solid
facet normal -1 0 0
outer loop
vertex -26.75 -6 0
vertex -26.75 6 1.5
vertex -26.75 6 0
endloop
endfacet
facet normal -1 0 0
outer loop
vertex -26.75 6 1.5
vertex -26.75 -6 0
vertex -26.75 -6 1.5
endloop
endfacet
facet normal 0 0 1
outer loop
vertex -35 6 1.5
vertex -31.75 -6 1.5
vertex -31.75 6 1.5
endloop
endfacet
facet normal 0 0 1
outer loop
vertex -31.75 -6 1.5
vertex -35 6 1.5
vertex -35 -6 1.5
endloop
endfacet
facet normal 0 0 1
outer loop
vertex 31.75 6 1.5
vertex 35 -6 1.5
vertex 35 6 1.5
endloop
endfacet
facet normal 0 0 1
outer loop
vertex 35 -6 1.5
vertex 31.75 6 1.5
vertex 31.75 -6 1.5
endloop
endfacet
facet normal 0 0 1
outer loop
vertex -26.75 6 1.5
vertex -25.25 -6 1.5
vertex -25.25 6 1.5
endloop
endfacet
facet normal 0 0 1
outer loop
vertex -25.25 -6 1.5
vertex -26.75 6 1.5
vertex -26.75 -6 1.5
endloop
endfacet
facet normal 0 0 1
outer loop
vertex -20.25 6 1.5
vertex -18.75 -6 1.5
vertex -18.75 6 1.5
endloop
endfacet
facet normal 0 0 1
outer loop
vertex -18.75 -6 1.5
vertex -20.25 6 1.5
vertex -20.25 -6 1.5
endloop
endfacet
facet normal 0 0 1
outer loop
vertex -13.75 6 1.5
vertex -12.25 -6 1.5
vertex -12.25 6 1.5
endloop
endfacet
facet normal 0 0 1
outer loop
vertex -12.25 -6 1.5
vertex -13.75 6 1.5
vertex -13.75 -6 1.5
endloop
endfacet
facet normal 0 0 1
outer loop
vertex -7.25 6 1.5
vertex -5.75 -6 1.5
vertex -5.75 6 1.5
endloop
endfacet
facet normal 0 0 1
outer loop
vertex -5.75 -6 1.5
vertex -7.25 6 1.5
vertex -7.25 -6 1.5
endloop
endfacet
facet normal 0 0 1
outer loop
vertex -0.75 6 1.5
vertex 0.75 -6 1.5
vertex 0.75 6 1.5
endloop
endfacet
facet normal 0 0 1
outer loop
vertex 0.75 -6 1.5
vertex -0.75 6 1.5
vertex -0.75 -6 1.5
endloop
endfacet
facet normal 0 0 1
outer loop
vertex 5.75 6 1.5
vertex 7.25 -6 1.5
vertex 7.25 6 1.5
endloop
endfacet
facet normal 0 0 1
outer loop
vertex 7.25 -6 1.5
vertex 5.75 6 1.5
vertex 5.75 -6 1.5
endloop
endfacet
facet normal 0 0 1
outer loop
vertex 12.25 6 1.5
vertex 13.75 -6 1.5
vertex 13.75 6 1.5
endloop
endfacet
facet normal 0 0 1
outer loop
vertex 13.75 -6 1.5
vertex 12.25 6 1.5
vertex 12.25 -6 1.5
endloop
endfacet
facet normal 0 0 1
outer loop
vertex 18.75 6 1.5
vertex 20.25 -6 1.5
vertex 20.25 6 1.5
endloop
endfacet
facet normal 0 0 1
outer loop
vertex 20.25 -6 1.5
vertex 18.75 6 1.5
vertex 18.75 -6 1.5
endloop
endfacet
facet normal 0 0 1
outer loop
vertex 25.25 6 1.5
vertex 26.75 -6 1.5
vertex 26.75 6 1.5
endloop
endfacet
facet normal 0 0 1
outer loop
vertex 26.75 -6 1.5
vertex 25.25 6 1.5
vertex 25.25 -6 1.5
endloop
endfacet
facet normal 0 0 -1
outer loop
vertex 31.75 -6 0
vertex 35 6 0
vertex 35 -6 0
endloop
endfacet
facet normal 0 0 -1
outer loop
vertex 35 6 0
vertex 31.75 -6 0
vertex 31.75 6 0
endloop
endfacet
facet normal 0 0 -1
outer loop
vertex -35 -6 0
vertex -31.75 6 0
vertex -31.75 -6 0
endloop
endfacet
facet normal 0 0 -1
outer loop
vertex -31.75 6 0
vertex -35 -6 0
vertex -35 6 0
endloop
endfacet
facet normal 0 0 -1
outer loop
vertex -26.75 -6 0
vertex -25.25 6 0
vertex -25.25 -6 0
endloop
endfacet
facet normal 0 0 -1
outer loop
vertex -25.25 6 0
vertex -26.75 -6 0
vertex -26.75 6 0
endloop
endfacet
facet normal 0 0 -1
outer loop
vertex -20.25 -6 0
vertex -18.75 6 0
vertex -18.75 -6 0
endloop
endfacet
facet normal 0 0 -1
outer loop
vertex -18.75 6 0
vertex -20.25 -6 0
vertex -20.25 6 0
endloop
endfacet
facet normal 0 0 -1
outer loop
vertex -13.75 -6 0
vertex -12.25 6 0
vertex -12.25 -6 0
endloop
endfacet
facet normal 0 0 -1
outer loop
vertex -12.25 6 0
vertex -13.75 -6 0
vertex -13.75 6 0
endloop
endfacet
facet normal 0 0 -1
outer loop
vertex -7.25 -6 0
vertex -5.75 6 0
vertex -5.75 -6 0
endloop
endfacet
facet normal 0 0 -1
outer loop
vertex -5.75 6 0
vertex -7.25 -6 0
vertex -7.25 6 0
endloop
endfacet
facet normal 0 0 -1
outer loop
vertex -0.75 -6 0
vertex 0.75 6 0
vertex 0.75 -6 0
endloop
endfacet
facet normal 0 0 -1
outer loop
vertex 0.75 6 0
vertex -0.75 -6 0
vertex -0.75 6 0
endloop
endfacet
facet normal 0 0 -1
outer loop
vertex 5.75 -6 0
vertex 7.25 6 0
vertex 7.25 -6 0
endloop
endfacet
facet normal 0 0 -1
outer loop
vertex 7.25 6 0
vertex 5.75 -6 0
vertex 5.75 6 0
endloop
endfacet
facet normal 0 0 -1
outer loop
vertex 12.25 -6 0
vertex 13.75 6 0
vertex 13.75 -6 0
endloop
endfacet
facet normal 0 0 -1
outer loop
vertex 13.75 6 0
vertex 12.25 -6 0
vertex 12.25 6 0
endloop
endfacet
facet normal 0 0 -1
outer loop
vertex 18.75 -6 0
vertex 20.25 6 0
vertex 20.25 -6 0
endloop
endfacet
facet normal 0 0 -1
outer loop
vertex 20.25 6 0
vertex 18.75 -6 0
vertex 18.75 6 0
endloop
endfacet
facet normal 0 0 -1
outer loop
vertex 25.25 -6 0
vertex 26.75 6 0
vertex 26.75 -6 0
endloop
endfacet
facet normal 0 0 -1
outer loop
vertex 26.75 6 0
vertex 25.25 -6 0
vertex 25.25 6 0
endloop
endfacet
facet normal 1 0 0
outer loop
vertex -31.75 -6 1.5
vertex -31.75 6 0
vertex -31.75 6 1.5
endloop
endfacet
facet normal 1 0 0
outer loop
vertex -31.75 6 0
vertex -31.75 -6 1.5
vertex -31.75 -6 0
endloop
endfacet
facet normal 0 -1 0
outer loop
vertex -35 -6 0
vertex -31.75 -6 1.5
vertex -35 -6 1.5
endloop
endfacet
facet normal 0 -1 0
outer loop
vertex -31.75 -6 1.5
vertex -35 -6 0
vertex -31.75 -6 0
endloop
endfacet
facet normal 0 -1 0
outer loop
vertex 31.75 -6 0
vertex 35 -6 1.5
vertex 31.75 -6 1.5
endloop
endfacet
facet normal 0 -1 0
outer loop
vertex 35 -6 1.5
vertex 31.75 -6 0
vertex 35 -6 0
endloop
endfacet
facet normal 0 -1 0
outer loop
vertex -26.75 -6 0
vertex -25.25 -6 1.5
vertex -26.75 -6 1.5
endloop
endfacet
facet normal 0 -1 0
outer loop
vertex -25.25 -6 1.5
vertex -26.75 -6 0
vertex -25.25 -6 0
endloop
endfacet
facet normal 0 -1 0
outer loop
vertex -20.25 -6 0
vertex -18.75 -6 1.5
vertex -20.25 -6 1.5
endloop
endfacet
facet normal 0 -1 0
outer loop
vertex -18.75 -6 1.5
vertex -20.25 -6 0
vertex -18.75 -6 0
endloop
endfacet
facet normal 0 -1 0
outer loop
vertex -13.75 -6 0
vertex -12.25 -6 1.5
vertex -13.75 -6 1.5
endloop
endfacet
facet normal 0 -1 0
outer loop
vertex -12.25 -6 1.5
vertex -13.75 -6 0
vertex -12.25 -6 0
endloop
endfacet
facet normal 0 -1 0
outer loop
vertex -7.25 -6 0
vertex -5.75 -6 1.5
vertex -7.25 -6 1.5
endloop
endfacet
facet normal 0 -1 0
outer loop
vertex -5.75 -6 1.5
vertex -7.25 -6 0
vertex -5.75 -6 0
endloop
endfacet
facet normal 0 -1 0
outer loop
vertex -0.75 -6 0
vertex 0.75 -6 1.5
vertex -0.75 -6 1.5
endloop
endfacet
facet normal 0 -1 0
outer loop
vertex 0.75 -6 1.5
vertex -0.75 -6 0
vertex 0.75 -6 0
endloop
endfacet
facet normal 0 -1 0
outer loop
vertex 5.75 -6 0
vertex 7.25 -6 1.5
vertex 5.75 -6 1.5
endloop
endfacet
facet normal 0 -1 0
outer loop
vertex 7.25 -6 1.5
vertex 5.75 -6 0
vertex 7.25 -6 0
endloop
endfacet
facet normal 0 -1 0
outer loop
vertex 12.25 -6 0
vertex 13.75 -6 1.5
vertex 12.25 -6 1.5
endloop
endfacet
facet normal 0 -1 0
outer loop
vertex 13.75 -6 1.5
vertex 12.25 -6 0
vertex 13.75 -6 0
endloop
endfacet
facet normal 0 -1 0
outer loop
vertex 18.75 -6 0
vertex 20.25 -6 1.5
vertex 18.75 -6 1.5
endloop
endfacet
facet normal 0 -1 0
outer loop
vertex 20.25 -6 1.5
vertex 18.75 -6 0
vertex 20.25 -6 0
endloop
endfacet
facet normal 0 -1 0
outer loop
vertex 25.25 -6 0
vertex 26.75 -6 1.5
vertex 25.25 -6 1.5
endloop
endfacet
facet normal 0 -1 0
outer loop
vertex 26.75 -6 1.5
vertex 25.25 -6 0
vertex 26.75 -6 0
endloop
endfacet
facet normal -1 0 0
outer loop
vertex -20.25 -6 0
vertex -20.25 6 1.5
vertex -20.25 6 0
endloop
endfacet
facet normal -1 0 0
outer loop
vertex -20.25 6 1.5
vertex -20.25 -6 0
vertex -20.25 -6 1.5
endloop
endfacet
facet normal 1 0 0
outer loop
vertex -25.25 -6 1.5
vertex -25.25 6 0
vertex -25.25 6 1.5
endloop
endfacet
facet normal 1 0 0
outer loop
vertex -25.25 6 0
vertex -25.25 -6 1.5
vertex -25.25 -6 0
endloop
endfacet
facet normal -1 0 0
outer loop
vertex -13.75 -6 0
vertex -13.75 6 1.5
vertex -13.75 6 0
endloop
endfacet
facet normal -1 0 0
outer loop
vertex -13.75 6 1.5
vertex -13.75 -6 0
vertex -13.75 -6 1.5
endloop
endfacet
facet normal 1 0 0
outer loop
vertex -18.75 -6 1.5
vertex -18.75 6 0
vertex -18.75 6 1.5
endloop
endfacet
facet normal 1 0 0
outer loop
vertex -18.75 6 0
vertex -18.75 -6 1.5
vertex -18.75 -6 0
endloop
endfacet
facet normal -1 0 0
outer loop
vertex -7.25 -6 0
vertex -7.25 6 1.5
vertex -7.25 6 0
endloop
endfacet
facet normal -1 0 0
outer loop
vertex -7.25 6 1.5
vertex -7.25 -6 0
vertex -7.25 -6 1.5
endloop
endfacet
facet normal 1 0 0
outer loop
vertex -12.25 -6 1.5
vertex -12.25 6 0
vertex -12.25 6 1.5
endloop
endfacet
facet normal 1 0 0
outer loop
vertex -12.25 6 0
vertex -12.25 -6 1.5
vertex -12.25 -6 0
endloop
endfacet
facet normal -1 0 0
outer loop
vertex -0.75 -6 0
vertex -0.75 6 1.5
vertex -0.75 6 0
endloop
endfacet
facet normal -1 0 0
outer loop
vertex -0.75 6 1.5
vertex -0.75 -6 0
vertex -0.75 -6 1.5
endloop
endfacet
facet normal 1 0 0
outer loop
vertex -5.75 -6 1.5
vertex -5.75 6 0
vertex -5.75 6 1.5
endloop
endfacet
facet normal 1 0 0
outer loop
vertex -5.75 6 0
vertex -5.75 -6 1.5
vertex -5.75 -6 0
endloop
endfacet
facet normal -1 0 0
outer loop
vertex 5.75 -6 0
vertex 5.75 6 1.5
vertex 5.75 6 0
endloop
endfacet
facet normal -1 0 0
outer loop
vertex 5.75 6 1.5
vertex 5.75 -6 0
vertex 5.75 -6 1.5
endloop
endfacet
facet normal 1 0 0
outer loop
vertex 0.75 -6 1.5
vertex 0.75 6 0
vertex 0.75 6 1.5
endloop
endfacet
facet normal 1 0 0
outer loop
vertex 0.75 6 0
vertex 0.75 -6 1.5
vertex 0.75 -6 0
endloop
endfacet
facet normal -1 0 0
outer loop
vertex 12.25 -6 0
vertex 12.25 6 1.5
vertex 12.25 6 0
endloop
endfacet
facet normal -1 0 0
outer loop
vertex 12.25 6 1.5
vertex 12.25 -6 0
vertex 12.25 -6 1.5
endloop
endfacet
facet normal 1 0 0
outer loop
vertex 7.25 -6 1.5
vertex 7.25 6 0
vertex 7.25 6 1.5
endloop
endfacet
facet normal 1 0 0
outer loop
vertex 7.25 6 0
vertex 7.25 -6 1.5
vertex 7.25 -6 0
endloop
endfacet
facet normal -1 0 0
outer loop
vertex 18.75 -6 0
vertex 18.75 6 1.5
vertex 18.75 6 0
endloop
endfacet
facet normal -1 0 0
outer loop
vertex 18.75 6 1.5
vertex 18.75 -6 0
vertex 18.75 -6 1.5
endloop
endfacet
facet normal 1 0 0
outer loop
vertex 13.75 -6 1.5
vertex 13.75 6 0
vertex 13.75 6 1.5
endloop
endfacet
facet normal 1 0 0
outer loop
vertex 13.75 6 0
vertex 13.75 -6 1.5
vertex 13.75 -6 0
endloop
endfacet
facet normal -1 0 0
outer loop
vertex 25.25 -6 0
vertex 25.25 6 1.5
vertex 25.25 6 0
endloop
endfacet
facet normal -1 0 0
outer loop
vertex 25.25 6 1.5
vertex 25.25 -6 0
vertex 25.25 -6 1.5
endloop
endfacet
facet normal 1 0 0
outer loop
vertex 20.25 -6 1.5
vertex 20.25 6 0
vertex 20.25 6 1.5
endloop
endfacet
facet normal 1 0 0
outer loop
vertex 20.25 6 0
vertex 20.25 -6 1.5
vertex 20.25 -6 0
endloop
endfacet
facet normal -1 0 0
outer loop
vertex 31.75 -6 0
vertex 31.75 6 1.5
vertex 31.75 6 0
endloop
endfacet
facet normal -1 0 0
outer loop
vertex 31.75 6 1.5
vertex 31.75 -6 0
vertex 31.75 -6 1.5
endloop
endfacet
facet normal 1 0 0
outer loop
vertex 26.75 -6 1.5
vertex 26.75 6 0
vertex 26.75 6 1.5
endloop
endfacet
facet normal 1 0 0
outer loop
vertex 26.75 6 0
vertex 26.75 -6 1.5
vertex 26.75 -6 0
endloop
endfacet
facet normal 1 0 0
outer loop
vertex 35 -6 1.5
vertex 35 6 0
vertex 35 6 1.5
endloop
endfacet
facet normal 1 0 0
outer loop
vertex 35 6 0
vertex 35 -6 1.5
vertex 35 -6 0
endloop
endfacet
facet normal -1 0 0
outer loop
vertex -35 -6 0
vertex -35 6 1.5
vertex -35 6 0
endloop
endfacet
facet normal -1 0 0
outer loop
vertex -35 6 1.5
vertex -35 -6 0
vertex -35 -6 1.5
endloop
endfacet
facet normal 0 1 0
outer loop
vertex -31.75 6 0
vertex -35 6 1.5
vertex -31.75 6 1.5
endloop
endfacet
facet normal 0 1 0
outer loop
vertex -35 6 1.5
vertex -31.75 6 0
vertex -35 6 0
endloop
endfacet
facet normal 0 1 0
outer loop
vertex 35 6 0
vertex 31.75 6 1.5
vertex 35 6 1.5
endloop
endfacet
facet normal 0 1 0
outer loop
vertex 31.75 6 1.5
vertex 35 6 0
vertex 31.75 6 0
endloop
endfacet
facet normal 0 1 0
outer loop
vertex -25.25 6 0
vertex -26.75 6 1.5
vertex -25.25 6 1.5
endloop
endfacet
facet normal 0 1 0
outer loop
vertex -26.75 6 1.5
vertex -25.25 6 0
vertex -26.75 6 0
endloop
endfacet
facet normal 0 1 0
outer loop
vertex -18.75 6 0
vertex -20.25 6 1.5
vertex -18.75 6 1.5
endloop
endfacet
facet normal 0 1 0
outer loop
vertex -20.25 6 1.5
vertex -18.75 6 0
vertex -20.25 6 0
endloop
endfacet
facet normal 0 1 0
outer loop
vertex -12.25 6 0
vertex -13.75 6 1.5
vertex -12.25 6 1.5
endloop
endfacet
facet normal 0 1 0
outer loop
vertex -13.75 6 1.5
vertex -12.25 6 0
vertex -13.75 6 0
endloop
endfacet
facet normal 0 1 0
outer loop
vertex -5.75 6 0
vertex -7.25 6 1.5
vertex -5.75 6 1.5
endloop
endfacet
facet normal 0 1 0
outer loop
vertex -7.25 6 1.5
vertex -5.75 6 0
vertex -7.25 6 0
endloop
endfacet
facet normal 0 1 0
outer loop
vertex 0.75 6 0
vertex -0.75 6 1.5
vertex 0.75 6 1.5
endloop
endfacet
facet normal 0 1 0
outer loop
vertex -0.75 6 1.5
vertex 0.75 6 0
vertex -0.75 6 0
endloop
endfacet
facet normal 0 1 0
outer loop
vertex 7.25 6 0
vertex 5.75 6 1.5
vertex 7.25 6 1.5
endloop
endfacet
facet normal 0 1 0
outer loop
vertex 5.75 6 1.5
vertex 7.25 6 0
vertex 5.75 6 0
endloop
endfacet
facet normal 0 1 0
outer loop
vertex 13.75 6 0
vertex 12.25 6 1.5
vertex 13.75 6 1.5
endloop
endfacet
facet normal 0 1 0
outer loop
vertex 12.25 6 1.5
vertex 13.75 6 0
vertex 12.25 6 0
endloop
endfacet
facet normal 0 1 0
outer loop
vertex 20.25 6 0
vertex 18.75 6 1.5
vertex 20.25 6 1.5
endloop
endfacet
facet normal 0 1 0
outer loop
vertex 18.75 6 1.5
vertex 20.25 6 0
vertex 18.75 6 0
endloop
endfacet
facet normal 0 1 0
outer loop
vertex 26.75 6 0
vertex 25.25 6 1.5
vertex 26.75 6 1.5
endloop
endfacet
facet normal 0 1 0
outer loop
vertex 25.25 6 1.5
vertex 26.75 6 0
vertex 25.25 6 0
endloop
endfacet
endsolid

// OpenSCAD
// 10-well comb for casting agarose gels
// Print orientation: flat on bed, teeth pointing down (-Y)

// ---------- Parameters ----------
plate_t      = 1.5;   // plate thickness (Z)
spine_l      = 70;    // spine length (X)
spine_w      = 12;    // spine width (Y)
tooth_n      = 10;    // number of teeth
tooth_w      = 5.0;   // tooth width (X)
tooth_l      = 12;    // tooth length (Y)
gap          = 1.5;   // gap between teeth (X)
eps          = 0.5;   // cutter overshoot past faces (Z)

$fn = 64;

// ---------- Derived ----------
pitch   = tooth_w + gap;            // centre-to-centre spacing of teeth
x_start = -(tooth_n - 1) * pitch / 2; // first tooth centre (row centred on spine)

// ---------- Model ----------
difference() {
    // Flat plate with spine and teeth in +Y
    union() {
        // Spine (back bar)
        translate([-spine_l / 2, -spine_w / 2, 0])
            cube([spine_l, spine_w, plate_t]);

        // Teeth hanging from the long edge of the spine
        for (i = [0 : tooth_n - 1])
            translate([x_start + i * pitch - tooth_w / 2,
                       spine_w / 2 - tooth_l,
                       0])
                cube([tooth_w, tooth_l + eps, plate_t]);
    }

    // Cut out the 10 wells seen from above
    for (i = [0 : tooth_n - 1])
        translate([x_start + i * pitch - tooth_w / 2,
                   spine_w / 2 - tooth_l,
                   -eps])
            cube([tooth_w, tooth_l + 2 * eps, plate_t + 2 * eps]);
}
